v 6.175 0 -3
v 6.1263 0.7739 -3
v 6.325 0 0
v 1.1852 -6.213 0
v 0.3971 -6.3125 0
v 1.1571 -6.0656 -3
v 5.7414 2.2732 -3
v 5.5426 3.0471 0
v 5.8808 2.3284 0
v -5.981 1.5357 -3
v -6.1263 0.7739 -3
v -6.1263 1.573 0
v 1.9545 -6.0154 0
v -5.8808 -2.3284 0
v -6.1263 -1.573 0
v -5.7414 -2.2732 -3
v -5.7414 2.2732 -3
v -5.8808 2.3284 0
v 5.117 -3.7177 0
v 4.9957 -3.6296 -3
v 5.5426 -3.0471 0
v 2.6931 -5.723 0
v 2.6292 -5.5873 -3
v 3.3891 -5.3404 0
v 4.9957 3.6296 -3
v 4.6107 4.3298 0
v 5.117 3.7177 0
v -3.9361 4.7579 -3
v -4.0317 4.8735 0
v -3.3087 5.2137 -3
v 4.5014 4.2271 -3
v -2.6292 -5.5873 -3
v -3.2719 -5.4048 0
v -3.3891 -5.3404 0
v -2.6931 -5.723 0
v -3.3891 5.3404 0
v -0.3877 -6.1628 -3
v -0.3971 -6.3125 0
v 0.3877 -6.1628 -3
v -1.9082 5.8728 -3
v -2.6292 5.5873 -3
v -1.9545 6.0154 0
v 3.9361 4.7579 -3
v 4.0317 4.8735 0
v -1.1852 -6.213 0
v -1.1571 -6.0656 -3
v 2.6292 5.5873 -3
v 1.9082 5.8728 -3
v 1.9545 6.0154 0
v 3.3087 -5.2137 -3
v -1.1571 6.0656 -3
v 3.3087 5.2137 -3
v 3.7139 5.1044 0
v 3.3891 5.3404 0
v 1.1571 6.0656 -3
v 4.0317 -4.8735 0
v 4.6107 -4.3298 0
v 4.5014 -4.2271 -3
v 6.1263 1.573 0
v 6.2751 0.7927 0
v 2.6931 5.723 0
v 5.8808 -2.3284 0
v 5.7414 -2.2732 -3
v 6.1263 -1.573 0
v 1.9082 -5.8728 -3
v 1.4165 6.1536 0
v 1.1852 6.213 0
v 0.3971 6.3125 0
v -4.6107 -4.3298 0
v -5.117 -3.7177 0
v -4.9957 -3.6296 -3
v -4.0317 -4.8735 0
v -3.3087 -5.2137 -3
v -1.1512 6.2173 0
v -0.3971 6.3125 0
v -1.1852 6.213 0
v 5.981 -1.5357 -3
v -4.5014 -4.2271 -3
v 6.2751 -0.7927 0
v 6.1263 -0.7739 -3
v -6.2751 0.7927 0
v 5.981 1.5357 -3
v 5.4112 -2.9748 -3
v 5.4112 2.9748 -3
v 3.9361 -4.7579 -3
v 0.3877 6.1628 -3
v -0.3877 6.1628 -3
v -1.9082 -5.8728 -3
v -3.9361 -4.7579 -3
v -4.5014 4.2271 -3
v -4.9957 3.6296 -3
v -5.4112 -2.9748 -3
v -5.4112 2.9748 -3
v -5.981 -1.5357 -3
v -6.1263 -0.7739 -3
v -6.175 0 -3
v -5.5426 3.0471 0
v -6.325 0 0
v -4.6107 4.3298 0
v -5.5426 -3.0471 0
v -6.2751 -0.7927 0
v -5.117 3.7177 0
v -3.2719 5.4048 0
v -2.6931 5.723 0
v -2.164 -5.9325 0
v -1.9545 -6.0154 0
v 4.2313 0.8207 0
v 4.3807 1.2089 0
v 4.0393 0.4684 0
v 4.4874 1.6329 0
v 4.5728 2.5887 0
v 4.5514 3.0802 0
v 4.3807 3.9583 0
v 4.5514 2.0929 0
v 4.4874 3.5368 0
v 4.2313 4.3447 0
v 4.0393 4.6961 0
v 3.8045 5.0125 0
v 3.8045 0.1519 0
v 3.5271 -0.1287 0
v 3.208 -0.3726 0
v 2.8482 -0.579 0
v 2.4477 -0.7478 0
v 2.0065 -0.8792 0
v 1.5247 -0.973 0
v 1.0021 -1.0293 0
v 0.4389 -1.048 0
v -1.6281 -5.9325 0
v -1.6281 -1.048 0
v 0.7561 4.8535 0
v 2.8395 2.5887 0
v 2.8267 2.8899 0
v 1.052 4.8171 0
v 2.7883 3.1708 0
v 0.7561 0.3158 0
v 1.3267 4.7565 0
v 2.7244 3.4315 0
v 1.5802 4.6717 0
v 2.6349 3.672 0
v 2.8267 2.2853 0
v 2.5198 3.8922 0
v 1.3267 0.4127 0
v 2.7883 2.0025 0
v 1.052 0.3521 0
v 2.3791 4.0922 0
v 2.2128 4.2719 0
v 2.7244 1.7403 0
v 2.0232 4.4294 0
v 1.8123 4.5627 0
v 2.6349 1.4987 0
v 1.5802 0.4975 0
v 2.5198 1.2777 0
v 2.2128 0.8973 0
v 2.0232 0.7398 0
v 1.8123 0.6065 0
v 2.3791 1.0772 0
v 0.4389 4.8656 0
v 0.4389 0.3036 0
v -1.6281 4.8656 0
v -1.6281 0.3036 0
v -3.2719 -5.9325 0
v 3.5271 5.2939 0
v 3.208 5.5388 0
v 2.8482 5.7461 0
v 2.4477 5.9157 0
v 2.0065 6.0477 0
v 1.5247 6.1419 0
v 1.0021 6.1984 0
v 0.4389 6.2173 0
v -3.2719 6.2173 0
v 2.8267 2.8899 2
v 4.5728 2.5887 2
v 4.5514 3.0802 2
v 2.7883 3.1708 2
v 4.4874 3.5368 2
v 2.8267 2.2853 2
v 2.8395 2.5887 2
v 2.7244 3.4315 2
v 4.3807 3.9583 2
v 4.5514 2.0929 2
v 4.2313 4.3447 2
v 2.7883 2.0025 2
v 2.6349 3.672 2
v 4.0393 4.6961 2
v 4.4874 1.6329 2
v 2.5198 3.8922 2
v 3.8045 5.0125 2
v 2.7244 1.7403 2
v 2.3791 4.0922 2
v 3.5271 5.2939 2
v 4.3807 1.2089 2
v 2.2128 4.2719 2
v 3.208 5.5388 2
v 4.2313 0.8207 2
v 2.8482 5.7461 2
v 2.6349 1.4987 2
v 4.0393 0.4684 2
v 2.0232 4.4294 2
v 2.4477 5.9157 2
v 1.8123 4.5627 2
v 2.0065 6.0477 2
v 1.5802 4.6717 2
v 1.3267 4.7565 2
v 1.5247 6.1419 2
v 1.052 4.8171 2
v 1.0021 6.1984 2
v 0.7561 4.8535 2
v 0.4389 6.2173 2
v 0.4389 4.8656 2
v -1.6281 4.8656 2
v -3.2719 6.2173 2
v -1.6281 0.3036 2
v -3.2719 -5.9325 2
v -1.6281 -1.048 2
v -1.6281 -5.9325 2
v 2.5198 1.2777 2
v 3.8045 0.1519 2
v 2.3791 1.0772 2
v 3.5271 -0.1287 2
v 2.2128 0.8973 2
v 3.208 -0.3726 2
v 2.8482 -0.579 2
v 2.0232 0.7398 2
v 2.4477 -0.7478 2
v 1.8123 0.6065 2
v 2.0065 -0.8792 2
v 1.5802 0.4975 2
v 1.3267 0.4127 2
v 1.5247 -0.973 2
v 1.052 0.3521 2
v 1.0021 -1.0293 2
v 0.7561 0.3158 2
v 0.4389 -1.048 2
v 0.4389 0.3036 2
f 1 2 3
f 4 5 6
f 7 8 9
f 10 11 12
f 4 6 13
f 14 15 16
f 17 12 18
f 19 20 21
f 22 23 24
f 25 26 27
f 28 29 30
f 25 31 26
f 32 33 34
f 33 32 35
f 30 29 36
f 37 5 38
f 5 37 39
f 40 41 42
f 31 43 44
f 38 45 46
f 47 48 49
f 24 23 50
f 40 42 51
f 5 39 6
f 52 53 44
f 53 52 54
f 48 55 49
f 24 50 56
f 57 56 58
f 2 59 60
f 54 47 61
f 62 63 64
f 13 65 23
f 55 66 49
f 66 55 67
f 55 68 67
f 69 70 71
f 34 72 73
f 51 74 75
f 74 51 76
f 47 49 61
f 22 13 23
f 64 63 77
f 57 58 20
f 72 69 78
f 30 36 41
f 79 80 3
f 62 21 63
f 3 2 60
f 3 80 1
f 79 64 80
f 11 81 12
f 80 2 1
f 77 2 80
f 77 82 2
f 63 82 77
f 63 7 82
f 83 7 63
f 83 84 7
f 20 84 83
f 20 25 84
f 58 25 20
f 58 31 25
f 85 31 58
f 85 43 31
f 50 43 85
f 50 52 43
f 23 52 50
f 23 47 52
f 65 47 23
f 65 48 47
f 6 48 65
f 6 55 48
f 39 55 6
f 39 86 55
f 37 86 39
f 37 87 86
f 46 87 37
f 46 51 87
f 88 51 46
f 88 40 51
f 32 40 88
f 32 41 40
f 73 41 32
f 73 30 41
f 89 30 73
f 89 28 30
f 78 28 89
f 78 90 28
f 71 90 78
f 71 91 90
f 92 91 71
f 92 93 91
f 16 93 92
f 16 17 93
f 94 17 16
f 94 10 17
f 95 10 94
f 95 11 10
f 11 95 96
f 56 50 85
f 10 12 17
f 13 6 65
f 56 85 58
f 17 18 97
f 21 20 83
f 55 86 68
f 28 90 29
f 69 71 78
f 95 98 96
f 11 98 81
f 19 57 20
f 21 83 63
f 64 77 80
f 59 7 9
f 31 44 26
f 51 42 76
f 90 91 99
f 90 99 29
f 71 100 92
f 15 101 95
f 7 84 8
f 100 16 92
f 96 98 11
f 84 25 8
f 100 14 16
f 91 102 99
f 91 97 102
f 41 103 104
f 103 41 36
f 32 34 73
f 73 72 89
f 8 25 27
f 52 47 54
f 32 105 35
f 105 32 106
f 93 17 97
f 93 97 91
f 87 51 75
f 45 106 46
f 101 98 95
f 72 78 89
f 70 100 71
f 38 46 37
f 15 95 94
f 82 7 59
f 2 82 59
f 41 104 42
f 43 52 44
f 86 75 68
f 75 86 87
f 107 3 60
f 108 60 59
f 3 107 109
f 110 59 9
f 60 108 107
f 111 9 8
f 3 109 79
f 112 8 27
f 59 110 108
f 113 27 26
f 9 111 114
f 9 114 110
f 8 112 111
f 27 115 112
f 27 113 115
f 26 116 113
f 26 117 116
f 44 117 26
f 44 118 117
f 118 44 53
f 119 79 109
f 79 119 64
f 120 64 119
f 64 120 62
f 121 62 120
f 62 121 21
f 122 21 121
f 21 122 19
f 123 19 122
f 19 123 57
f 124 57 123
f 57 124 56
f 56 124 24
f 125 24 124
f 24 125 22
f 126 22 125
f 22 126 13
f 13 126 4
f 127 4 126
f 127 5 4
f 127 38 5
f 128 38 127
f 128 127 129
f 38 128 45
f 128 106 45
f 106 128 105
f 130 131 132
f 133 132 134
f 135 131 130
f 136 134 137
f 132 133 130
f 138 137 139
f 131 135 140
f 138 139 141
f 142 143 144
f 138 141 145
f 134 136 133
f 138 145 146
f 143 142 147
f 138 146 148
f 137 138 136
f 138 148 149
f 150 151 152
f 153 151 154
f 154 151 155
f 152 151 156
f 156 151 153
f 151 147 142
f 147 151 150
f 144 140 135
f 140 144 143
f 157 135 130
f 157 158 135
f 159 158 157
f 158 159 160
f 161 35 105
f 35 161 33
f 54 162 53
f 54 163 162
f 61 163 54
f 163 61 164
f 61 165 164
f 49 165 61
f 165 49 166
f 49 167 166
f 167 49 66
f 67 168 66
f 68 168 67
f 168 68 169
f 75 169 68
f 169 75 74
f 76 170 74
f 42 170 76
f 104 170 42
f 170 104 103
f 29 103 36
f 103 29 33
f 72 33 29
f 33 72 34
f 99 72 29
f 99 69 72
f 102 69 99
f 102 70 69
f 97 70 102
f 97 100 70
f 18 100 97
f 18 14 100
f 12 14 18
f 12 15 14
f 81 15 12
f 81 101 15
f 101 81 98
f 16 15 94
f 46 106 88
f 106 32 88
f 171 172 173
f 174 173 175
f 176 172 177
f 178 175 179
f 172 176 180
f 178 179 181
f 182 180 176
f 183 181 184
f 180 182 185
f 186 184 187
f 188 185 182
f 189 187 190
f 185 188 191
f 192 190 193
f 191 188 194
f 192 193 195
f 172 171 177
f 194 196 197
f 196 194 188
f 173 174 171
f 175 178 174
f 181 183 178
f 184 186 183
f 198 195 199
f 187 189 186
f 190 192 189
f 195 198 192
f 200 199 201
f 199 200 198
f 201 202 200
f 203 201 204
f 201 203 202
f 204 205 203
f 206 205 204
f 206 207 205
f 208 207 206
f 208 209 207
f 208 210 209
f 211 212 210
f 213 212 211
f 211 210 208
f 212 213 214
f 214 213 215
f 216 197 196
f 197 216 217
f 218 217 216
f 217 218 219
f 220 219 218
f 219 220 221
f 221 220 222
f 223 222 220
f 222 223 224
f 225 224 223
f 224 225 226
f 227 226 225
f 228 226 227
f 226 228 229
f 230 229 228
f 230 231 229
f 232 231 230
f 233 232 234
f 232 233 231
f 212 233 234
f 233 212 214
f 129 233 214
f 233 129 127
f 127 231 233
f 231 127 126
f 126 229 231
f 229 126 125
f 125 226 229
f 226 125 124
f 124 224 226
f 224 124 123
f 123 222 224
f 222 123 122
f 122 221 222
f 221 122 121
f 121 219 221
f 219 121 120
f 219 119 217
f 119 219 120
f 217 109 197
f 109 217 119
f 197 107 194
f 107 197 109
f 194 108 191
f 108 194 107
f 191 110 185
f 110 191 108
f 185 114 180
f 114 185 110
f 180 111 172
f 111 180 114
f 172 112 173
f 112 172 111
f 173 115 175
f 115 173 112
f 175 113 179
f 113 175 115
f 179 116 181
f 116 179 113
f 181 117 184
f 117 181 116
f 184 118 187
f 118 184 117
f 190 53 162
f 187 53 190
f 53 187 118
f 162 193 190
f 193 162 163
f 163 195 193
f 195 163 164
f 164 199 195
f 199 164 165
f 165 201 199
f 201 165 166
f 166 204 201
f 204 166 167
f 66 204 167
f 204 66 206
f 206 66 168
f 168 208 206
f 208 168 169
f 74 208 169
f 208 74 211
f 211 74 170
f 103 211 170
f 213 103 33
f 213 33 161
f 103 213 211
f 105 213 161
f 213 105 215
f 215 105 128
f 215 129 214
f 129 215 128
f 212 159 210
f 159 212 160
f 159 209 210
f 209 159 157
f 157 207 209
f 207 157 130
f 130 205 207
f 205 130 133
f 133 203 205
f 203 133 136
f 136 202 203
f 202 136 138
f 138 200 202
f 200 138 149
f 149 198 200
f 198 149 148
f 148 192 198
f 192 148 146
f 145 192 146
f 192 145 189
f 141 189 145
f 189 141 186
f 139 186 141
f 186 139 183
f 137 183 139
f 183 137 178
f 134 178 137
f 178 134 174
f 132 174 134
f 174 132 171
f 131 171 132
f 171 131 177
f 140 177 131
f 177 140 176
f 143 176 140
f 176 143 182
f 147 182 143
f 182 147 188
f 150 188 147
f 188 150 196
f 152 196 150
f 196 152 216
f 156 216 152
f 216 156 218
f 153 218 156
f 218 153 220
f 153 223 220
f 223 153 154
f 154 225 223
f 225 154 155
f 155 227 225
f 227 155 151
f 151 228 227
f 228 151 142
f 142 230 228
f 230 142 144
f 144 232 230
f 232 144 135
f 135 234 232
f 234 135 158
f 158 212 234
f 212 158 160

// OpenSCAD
$fn = 50;

difference() {
	union() {
		translate(v = [0, 0, -3.0]) {
			cylinder(h = 3, r1 = 6.175, r2 = 6.325);
		}
		linear_extrude(height = 2) {
			text(font = "Impact", halign = "center", size = 12, text = "P", valign = "center");
		}
	}
	union();
}
